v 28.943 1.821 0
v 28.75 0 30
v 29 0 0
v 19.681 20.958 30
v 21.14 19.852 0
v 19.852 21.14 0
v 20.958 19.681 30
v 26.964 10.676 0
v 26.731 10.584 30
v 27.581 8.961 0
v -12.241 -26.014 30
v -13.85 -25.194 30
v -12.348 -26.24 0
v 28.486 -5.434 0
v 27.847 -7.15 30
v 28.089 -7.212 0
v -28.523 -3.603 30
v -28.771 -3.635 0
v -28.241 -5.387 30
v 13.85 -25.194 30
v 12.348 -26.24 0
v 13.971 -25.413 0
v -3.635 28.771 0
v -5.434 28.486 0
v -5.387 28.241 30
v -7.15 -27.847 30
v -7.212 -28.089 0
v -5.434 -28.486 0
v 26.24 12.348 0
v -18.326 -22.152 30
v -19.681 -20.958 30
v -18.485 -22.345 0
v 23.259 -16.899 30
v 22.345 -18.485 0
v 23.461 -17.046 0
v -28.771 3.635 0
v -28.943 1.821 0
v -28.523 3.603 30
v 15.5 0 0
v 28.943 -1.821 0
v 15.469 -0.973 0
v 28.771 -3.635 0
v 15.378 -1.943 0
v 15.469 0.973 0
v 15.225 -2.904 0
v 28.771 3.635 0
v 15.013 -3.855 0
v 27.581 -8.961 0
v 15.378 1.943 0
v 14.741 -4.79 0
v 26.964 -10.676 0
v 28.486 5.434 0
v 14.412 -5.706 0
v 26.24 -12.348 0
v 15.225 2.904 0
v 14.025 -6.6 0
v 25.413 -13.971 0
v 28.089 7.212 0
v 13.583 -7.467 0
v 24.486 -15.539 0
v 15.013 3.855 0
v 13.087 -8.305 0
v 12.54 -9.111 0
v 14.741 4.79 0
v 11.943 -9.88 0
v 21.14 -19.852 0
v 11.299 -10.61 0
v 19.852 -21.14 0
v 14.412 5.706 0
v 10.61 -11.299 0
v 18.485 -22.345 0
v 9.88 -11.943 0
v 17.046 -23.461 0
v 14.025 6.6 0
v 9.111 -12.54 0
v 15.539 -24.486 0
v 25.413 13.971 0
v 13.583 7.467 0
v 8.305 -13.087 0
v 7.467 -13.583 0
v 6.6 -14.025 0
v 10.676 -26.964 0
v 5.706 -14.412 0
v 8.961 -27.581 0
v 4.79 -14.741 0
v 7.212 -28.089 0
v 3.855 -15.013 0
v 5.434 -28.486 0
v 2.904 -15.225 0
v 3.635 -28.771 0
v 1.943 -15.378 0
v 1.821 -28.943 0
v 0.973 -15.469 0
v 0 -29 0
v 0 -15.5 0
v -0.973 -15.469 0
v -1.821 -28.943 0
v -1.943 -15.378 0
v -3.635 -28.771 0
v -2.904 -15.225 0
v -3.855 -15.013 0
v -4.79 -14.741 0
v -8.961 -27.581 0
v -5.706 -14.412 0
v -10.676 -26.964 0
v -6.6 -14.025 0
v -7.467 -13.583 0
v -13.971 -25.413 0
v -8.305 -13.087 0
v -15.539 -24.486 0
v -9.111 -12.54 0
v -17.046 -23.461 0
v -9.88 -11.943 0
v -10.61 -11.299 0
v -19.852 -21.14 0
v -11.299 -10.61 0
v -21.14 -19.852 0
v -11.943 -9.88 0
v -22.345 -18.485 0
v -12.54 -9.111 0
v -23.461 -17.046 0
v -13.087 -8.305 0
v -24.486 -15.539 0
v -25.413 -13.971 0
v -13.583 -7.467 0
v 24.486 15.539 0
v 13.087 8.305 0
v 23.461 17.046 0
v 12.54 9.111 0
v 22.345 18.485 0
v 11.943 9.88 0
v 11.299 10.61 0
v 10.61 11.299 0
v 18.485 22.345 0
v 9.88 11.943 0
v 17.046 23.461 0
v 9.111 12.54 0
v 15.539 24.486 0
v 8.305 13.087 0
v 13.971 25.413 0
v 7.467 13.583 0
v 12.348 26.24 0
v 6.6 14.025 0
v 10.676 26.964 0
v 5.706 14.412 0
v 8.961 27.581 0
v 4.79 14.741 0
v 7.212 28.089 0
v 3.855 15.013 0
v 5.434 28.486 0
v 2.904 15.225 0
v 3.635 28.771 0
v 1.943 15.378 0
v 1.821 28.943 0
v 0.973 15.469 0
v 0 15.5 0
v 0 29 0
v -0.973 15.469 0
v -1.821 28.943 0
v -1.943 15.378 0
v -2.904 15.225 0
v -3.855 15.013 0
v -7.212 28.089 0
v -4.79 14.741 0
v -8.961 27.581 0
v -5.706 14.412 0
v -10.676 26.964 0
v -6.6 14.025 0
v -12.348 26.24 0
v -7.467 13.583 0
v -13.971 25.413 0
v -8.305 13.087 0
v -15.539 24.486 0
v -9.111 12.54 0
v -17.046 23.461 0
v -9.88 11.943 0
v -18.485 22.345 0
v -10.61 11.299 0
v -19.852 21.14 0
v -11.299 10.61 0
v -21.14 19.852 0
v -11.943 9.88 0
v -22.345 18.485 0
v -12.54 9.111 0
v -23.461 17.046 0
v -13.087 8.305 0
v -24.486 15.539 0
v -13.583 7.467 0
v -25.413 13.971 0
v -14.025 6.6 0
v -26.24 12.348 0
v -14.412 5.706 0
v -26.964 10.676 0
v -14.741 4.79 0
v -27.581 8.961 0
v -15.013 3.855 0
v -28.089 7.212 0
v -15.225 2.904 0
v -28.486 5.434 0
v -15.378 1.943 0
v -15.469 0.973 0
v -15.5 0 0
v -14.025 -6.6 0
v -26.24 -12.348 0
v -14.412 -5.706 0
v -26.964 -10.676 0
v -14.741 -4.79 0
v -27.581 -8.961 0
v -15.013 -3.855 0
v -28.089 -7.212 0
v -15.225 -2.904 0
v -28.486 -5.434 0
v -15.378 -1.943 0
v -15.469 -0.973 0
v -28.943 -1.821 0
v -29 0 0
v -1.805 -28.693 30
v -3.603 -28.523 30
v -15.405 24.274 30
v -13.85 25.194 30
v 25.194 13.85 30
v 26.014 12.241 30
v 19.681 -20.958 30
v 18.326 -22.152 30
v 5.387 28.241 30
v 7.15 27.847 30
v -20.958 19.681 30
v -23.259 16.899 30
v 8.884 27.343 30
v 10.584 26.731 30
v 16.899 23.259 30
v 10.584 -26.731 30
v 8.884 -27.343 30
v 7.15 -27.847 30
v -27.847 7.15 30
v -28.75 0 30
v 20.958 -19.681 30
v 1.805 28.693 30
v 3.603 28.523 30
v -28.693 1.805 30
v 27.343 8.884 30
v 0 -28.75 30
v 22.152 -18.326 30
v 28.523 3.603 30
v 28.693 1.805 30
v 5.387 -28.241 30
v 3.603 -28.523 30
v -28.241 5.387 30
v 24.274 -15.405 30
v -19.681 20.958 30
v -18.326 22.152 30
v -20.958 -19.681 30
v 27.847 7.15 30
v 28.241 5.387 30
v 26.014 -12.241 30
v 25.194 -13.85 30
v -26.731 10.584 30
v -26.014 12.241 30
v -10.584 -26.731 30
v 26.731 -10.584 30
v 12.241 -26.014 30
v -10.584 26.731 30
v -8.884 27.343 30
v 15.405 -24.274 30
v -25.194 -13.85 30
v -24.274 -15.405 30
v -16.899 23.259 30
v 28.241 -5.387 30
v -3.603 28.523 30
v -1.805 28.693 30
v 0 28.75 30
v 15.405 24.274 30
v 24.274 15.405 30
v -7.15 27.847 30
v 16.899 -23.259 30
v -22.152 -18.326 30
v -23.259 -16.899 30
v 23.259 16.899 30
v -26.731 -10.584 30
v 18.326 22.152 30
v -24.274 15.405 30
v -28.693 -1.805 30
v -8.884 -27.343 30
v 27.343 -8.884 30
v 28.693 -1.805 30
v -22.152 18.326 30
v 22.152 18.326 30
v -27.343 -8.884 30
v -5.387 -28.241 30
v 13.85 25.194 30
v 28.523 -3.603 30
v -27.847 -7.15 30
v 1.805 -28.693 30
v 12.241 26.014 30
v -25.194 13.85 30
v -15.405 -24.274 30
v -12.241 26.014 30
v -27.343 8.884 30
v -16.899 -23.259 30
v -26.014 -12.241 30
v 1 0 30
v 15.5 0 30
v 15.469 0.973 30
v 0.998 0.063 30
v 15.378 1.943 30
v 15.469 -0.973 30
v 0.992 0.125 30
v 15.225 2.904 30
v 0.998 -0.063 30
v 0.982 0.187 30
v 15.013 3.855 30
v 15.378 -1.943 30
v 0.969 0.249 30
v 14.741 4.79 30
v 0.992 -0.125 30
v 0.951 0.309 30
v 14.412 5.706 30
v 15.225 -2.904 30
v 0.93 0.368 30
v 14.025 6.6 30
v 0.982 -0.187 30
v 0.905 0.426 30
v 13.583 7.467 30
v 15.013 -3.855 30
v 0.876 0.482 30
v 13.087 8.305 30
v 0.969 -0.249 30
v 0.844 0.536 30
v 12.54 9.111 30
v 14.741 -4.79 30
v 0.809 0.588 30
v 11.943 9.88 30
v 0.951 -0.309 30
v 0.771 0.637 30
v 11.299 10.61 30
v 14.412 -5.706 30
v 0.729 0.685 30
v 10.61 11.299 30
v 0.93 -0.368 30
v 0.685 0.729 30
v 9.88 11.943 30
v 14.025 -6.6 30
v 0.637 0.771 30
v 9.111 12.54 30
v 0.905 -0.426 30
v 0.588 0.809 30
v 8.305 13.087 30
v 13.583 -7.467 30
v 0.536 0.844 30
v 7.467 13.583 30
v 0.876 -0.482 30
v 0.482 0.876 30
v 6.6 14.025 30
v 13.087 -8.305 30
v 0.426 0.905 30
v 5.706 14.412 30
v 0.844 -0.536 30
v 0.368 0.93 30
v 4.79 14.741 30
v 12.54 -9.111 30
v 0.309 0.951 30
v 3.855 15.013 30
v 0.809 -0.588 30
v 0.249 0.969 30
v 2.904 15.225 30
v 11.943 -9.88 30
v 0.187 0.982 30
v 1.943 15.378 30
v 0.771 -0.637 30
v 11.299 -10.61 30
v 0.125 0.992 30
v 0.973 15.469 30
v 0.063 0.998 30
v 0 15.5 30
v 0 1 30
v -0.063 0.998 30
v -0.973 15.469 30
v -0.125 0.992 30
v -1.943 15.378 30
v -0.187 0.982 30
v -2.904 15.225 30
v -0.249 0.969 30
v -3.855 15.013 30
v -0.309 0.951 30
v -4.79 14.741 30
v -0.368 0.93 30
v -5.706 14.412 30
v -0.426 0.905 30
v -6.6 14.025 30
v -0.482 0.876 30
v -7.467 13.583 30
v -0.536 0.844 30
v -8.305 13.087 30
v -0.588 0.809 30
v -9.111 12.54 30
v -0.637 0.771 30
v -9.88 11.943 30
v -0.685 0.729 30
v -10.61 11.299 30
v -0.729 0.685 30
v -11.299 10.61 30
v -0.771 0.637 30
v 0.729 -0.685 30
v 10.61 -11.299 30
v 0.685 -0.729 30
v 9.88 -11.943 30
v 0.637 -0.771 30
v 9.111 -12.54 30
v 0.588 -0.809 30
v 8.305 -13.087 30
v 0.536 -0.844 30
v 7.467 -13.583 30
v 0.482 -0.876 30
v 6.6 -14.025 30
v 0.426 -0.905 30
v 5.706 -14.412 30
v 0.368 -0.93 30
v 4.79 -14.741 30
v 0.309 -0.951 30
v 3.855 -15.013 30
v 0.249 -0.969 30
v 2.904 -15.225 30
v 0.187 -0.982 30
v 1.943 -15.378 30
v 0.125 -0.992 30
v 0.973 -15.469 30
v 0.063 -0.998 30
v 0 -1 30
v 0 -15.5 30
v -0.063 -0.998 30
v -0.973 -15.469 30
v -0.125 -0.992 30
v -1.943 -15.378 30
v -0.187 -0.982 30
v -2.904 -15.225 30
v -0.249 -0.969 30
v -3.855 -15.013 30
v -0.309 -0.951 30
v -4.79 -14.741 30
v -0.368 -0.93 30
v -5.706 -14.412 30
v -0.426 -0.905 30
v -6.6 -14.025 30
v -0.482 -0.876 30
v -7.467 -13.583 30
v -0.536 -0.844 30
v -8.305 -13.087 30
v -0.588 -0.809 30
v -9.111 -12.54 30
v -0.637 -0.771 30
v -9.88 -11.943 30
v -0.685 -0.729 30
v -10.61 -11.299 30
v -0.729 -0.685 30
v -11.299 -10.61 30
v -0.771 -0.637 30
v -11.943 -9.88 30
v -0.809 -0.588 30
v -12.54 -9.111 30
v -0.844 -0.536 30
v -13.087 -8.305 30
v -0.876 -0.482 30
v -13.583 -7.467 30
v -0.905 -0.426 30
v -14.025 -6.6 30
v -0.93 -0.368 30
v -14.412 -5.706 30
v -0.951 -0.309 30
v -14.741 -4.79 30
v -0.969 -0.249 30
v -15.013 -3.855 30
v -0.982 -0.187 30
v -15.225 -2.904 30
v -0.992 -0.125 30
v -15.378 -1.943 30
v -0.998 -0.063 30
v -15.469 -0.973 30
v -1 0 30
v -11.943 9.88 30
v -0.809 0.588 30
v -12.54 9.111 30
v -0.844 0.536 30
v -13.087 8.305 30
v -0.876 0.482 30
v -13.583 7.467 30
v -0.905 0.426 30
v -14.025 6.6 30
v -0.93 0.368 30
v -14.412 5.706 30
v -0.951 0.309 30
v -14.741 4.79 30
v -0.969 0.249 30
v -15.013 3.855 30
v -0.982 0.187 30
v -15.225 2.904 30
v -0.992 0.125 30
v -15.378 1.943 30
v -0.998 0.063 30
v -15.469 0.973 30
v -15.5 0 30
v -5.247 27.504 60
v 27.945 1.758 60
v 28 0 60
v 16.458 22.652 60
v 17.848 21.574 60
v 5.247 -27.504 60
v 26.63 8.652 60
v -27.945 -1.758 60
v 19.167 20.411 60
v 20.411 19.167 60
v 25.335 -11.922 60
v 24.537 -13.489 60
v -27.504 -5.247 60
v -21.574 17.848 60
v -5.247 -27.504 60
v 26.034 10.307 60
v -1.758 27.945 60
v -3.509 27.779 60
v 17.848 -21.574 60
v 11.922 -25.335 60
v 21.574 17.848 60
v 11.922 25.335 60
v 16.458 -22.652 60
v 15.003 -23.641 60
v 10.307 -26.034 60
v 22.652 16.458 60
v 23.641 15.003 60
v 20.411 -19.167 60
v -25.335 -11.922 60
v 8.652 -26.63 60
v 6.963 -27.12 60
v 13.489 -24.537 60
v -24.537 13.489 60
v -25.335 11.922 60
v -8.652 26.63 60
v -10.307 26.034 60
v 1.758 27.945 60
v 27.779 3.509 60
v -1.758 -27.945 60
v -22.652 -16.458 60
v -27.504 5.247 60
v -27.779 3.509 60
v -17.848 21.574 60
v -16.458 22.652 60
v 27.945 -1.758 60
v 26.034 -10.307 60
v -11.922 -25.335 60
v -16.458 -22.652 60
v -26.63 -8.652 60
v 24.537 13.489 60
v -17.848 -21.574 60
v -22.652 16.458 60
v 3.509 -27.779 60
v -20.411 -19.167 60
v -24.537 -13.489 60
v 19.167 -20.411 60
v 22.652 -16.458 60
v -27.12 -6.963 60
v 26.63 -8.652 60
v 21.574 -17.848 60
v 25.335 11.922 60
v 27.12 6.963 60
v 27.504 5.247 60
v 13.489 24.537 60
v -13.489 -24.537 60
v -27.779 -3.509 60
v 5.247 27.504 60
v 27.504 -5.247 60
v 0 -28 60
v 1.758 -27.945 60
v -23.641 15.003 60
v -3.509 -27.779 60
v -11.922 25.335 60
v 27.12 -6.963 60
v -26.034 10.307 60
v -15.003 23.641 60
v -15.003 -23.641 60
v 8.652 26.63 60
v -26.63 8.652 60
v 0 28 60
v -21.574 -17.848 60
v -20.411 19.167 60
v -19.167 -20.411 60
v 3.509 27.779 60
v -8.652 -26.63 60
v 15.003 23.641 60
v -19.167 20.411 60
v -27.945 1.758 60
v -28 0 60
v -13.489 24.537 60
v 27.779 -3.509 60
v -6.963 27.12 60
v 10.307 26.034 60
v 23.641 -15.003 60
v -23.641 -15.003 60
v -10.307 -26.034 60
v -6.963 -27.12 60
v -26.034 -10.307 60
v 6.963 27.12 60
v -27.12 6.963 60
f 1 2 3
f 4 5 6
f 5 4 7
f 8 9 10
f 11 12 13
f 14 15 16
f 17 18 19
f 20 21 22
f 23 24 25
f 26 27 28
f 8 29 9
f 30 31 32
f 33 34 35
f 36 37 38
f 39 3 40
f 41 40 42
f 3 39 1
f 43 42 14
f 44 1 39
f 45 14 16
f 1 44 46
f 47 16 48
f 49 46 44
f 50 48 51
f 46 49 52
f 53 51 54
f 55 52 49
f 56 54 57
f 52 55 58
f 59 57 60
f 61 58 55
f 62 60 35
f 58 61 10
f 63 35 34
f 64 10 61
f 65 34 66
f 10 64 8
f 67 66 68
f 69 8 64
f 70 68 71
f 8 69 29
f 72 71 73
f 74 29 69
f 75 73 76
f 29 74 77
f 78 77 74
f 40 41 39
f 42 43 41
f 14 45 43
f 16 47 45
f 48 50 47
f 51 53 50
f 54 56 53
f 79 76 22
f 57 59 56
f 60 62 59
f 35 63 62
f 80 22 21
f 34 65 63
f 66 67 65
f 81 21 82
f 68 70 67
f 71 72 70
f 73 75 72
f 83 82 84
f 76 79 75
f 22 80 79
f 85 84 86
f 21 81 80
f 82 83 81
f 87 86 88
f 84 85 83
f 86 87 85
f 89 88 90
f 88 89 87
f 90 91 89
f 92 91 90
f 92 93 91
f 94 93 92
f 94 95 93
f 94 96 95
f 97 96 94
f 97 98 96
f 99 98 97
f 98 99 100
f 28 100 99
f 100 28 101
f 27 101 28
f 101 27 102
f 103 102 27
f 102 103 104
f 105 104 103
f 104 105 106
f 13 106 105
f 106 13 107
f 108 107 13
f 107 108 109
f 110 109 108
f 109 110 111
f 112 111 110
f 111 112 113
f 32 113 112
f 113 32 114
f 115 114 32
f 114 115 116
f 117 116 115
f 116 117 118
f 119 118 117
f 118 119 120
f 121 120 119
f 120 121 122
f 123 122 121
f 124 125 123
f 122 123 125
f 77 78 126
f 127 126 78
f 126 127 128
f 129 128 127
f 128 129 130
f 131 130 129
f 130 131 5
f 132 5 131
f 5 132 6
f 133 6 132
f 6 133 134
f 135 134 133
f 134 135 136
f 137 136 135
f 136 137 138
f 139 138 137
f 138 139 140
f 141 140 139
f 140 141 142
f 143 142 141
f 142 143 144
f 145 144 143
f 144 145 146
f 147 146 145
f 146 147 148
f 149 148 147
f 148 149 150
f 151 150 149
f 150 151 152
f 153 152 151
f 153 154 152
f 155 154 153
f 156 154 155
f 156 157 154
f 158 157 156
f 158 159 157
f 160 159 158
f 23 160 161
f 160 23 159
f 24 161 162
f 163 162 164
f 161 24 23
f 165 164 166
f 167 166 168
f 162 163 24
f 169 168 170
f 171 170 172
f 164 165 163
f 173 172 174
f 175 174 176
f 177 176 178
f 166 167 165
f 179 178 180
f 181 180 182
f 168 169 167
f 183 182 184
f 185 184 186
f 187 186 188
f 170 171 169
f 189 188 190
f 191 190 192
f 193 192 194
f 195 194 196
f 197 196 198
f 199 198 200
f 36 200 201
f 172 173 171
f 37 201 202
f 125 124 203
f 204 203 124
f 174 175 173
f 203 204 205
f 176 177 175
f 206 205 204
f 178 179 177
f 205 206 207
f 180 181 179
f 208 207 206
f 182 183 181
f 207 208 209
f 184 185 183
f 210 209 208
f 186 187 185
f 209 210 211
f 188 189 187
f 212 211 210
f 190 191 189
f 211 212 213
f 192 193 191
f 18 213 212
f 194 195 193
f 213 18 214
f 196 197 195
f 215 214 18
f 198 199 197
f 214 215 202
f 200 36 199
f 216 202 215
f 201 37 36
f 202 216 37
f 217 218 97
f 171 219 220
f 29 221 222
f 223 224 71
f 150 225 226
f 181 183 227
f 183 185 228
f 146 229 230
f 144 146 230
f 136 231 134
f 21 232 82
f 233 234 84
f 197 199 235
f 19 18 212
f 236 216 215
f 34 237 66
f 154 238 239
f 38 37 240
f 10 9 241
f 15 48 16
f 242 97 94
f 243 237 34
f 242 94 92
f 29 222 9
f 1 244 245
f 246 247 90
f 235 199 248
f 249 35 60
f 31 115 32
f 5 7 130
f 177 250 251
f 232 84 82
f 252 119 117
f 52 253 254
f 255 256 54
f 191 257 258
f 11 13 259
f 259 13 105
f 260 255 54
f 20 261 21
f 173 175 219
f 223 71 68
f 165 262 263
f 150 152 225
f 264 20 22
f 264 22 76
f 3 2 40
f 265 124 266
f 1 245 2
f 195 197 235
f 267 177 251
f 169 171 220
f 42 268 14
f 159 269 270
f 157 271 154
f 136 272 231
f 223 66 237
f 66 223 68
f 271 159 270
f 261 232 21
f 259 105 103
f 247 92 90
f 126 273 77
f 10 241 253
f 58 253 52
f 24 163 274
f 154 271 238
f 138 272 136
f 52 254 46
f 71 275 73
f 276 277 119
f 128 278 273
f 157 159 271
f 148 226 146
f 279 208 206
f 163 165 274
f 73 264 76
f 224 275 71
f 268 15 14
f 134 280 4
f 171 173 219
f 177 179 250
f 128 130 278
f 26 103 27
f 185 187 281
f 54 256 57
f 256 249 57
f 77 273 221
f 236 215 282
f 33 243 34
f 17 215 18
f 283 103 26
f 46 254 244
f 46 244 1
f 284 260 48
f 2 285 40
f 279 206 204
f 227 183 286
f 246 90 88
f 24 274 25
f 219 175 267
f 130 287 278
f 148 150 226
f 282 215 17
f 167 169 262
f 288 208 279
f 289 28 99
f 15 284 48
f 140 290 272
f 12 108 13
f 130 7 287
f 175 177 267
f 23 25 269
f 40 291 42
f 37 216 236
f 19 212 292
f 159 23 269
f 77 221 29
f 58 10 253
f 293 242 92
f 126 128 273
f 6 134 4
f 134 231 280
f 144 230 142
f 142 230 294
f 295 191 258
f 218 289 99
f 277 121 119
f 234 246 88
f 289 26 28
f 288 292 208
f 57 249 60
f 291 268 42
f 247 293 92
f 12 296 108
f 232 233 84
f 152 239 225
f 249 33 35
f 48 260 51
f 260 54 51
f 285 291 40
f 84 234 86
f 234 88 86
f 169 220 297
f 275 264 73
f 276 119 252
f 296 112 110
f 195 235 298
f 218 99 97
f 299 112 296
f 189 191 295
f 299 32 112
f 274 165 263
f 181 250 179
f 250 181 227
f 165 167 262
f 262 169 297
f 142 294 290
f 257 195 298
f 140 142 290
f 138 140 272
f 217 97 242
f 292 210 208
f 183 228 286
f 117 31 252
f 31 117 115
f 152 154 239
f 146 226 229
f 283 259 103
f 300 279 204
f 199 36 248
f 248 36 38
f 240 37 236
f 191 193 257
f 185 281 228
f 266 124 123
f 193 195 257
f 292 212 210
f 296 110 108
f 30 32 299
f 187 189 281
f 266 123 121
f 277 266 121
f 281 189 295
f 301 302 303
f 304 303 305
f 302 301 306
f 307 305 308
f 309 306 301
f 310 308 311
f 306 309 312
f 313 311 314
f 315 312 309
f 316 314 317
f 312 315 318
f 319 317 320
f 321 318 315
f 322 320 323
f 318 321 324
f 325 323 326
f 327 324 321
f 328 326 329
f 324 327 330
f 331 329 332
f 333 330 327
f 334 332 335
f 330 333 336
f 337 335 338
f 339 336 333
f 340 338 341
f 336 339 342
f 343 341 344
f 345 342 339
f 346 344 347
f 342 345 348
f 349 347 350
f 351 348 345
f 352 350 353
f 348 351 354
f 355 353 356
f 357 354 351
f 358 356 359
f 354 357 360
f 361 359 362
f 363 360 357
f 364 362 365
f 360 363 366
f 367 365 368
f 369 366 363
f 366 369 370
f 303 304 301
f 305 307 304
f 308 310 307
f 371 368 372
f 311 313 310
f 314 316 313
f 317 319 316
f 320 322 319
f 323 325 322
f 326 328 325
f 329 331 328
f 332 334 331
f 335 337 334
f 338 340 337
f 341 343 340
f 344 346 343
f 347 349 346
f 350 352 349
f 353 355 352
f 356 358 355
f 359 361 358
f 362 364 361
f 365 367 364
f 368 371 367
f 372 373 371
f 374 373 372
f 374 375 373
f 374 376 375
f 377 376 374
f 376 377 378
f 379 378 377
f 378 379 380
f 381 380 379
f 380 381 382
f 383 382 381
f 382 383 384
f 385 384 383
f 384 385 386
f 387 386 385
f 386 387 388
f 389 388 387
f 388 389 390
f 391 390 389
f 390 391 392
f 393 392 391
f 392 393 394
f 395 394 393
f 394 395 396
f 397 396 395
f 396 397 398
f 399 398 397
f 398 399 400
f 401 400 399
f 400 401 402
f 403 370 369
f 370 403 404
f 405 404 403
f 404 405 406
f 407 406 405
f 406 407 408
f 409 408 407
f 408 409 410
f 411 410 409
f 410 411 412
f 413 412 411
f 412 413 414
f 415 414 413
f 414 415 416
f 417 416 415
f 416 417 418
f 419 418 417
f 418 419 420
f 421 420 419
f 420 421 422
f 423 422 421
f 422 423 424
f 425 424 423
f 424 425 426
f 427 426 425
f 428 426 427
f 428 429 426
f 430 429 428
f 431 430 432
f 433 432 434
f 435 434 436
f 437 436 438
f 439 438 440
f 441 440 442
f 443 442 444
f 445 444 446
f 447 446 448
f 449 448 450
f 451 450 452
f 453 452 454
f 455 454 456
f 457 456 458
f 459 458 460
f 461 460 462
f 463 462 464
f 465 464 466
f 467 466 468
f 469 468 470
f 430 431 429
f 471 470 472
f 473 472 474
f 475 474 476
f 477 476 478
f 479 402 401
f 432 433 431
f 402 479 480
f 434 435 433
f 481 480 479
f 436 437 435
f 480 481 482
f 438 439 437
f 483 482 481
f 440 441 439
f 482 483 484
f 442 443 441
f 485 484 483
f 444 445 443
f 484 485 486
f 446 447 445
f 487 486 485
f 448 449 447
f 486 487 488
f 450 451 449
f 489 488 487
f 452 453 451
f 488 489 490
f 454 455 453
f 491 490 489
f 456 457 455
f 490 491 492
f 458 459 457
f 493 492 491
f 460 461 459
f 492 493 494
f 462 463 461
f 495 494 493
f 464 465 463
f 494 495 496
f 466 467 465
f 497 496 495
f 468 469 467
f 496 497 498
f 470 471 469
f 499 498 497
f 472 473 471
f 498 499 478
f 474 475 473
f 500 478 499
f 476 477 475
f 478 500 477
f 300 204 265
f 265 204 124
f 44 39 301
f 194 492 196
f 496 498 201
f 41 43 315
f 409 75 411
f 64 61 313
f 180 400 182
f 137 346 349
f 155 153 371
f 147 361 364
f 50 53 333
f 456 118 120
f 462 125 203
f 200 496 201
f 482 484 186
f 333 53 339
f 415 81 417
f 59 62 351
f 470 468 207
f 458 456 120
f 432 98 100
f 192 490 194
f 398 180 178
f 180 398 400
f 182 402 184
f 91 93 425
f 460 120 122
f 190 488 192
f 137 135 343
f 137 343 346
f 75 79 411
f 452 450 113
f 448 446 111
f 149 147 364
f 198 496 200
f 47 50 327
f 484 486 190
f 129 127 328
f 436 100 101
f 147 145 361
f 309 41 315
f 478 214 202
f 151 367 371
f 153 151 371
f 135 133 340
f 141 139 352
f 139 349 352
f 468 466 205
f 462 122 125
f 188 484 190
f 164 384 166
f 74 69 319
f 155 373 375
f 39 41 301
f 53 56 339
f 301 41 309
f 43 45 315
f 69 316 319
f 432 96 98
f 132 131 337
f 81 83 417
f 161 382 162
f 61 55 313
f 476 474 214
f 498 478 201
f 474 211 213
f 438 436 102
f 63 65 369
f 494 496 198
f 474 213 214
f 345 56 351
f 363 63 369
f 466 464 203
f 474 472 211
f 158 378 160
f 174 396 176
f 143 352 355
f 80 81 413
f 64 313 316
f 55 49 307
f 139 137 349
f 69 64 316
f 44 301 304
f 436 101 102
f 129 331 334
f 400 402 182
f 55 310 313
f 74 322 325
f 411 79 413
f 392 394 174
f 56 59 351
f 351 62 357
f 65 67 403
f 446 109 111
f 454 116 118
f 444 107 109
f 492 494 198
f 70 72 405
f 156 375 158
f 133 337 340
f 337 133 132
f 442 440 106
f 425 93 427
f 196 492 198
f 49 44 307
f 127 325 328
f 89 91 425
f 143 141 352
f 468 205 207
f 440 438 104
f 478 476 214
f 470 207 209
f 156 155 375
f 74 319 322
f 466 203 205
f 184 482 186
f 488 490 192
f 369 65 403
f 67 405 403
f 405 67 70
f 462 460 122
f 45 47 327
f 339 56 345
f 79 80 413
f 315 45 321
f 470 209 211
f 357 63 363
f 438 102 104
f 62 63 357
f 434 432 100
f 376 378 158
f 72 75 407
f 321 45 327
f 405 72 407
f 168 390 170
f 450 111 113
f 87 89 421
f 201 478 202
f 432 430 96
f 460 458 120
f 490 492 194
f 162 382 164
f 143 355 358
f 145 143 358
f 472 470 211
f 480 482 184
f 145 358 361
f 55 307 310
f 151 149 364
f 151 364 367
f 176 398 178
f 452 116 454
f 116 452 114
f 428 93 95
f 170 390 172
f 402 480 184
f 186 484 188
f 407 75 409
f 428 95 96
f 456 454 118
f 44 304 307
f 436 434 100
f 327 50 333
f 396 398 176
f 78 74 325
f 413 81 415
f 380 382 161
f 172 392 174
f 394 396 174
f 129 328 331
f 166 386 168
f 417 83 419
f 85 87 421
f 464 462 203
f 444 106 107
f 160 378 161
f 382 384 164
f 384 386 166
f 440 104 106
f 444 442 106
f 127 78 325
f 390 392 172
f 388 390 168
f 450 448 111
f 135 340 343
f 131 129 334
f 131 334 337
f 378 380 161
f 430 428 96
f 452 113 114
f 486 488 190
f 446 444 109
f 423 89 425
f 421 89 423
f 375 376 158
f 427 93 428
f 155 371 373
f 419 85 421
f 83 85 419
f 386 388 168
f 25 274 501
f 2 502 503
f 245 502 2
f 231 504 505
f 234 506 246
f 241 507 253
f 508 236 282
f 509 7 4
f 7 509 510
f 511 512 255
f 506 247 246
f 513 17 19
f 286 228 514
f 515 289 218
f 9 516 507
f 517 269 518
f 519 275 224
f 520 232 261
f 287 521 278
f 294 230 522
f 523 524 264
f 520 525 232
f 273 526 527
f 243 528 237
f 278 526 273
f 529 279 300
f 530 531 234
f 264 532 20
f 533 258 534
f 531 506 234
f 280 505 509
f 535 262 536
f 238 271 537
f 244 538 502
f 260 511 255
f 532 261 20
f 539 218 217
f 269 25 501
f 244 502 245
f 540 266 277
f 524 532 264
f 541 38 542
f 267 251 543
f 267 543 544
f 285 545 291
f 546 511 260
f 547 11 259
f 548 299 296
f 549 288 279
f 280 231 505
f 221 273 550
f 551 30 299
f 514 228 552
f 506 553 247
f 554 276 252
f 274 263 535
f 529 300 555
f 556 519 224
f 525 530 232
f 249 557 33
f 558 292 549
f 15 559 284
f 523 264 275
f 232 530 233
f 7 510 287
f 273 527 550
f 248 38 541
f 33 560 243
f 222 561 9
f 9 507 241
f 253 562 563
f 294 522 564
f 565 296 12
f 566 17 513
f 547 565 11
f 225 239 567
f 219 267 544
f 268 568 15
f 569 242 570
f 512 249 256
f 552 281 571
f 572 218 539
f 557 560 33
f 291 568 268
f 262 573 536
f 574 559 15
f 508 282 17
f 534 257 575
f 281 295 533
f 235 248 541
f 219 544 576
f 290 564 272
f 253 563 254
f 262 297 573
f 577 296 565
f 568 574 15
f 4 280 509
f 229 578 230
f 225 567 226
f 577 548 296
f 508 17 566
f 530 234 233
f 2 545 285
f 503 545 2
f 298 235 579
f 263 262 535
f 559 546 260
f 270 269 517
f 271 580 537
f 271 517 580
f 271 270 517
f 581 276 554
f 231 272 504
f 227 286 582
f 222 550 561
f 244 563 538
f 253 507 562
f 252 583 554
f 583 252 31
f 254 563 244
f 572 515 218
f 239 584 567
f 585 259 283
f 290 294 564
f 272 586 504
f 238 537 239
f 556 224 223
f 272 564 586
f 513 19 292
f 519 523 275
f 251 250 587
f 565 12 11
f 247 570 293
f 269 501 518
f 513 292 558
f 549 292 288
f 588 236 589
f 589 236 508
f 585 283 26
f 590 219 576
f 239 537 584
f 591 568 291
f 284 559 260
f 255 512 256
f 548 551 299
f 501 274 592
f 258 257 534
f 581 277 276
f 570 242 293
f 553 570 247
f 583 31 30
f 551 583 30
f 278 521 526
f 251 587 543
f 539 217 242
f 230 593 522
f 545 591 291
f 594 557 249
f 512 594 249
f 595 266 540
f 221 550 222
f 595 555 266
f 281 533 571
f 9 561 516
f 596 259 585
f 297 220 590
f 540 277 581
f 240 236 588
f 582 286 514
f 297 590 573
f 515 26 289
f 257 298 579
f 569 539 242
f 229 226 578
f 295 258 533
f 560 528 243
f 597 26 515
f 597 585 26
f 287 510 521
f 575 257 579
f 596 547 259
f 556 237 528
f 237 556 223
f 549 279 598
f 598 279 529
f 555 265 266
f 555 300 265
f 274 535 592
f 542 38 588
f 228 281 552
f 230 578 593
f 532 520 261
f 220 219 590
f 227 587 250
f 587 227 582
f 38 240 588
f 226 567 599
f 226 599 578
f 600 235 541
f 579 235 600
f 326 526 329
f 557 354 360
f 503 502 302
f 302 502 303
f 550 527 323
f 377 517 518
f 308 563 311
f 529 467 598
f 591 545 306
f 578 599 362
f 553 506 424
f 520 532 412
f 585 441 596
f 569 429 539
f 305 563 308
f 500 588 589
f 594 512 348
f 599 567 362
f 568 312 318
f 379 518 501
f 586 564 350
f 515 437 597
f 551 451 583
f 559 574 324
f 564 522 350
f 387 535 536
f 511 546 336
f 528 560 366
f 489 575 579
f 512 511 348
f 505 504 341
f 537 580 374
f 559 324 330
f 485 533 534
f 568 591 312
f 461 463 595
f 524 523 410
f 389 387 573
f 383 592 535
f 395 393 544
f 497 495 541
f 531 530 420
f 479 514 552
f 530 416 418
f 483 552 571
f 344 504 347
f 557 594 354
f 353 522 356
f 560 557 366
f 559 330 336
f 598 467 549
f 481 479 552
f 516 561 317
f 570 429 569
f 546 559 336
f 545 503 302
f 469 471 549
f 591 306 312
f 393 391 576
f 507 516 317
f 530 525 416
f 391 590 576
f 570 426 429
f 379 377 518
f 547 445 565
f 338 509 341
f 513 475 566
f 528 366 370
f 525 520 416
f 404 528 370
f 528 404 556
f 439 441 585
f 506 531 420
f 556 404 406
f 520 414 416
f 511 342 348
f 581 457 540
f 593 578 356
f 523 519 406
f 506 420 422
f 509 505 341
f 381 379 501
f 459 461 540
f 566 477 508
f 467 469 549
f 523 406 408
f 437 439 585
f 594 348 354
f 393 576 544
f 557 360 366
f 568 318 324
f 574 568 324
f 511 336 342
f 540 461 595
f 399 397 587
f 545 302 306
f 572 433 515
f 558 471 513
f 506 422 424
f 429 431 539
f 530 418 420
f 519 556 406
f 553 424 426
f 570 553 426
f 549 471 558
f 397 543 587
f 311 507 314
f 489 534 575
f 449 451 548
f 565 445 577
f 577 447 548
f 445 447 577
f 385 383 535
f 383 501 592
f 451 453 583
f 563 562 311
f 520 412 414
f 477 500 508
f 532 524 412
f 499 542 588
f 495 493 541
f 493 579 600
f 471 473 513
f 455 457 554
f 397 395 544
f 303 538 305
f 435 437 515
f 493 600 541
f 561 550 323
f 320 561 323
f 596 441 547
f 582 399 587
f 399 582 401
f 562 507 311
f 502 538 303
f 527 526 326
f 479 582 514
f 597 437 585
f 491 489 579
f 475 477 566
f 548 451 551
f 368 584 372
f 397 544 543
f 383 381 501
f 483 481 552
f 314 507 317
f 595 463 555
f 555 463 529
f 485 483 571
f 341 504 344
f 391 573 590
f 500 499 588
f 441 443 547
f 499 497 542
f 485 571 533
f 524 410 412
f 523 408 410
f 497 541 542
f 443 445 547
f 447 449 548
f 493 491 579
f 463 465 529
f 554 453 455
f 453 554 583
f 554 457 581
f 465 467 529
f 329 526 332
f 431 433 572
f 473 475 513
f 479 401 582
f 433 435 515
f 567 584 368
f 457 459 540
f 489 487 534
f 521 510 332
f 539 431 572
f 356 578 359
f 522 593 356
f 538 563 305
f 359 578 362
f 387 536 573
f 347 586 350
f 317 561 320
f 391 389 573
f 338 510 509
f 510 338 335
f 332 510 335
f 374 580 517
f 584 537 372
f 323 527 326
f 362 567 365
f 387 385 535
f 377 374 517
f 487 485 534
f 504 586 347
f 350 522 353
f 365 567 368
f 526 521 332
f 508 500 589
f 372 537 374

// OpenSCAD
/*
Description : makes shop Vac attachment for Dewalt Table saw
*/

/*****************************************************************************
CONSTANTS
*****************************************************************************/
fn=100;
PI = 4 * atan2(1,1);
OUTER_DIAMETER1 = 57.5;
OUTER_DIAMETER2 = 58.0;

INNER_DIAMETER1 = 31.0;
INNER_DIAMETER2 = 32.0;

OUTER_DIAMETER3 = OUTER_DIAMETER1;
OUTER_DIAMETER4 = 56.0;

INNER_DIAMETER3 = 31.0;
INNER_DIAMETER4 = OUTER_DIAMETER4;
ADAPTER_HEIGHT = 30;

/*****************************************************************************
FUNCTIONS - code to make reading modules easier to understand.
******************************************************************************/
function half(x) = x/2;

/*****************************************************************************
Directives - defines what to build with optional features.
*****************************************************************************/
INCLUDE_THING = 0;
BUILD_THING = 1;

/*****************************************************************************
MAIN SUB - where the instructions start.
*****************************************************************************/
build();

/*****************************************************************************
MODULES: - the meat of the project.
*****************************************************************************/
module build()
{
    if (BUILD_THING) 
    {
        shopVacAttachment();
    }
}
/*
Version=3.0
*/

module shopVacAttachment() 
{
    union()
    {
        tube(ADAPTER_HEIGHT, OUTER_DIAMETER2, OUTER_DIAMETER1, INNER_DIAMETER1);
        translate([0,0,ADAPTER_HEIGHT])
        tube(ADAPTER_HEIGHT, OUTER_DIAMETER3, OUTER_DIAMETER4, INNER_DIAMETER3,INNER_DIAMETER4);
    }    
}


module tube(h, od1, od2, id1, id2)
{
    difference()
    {
        cylinder(h=h, d1=od1, d2=od2, center=false, $fn=100);
        cylinder(h=h, d1=id1, d2=id2, center=false, $fn=100);
    }
}
